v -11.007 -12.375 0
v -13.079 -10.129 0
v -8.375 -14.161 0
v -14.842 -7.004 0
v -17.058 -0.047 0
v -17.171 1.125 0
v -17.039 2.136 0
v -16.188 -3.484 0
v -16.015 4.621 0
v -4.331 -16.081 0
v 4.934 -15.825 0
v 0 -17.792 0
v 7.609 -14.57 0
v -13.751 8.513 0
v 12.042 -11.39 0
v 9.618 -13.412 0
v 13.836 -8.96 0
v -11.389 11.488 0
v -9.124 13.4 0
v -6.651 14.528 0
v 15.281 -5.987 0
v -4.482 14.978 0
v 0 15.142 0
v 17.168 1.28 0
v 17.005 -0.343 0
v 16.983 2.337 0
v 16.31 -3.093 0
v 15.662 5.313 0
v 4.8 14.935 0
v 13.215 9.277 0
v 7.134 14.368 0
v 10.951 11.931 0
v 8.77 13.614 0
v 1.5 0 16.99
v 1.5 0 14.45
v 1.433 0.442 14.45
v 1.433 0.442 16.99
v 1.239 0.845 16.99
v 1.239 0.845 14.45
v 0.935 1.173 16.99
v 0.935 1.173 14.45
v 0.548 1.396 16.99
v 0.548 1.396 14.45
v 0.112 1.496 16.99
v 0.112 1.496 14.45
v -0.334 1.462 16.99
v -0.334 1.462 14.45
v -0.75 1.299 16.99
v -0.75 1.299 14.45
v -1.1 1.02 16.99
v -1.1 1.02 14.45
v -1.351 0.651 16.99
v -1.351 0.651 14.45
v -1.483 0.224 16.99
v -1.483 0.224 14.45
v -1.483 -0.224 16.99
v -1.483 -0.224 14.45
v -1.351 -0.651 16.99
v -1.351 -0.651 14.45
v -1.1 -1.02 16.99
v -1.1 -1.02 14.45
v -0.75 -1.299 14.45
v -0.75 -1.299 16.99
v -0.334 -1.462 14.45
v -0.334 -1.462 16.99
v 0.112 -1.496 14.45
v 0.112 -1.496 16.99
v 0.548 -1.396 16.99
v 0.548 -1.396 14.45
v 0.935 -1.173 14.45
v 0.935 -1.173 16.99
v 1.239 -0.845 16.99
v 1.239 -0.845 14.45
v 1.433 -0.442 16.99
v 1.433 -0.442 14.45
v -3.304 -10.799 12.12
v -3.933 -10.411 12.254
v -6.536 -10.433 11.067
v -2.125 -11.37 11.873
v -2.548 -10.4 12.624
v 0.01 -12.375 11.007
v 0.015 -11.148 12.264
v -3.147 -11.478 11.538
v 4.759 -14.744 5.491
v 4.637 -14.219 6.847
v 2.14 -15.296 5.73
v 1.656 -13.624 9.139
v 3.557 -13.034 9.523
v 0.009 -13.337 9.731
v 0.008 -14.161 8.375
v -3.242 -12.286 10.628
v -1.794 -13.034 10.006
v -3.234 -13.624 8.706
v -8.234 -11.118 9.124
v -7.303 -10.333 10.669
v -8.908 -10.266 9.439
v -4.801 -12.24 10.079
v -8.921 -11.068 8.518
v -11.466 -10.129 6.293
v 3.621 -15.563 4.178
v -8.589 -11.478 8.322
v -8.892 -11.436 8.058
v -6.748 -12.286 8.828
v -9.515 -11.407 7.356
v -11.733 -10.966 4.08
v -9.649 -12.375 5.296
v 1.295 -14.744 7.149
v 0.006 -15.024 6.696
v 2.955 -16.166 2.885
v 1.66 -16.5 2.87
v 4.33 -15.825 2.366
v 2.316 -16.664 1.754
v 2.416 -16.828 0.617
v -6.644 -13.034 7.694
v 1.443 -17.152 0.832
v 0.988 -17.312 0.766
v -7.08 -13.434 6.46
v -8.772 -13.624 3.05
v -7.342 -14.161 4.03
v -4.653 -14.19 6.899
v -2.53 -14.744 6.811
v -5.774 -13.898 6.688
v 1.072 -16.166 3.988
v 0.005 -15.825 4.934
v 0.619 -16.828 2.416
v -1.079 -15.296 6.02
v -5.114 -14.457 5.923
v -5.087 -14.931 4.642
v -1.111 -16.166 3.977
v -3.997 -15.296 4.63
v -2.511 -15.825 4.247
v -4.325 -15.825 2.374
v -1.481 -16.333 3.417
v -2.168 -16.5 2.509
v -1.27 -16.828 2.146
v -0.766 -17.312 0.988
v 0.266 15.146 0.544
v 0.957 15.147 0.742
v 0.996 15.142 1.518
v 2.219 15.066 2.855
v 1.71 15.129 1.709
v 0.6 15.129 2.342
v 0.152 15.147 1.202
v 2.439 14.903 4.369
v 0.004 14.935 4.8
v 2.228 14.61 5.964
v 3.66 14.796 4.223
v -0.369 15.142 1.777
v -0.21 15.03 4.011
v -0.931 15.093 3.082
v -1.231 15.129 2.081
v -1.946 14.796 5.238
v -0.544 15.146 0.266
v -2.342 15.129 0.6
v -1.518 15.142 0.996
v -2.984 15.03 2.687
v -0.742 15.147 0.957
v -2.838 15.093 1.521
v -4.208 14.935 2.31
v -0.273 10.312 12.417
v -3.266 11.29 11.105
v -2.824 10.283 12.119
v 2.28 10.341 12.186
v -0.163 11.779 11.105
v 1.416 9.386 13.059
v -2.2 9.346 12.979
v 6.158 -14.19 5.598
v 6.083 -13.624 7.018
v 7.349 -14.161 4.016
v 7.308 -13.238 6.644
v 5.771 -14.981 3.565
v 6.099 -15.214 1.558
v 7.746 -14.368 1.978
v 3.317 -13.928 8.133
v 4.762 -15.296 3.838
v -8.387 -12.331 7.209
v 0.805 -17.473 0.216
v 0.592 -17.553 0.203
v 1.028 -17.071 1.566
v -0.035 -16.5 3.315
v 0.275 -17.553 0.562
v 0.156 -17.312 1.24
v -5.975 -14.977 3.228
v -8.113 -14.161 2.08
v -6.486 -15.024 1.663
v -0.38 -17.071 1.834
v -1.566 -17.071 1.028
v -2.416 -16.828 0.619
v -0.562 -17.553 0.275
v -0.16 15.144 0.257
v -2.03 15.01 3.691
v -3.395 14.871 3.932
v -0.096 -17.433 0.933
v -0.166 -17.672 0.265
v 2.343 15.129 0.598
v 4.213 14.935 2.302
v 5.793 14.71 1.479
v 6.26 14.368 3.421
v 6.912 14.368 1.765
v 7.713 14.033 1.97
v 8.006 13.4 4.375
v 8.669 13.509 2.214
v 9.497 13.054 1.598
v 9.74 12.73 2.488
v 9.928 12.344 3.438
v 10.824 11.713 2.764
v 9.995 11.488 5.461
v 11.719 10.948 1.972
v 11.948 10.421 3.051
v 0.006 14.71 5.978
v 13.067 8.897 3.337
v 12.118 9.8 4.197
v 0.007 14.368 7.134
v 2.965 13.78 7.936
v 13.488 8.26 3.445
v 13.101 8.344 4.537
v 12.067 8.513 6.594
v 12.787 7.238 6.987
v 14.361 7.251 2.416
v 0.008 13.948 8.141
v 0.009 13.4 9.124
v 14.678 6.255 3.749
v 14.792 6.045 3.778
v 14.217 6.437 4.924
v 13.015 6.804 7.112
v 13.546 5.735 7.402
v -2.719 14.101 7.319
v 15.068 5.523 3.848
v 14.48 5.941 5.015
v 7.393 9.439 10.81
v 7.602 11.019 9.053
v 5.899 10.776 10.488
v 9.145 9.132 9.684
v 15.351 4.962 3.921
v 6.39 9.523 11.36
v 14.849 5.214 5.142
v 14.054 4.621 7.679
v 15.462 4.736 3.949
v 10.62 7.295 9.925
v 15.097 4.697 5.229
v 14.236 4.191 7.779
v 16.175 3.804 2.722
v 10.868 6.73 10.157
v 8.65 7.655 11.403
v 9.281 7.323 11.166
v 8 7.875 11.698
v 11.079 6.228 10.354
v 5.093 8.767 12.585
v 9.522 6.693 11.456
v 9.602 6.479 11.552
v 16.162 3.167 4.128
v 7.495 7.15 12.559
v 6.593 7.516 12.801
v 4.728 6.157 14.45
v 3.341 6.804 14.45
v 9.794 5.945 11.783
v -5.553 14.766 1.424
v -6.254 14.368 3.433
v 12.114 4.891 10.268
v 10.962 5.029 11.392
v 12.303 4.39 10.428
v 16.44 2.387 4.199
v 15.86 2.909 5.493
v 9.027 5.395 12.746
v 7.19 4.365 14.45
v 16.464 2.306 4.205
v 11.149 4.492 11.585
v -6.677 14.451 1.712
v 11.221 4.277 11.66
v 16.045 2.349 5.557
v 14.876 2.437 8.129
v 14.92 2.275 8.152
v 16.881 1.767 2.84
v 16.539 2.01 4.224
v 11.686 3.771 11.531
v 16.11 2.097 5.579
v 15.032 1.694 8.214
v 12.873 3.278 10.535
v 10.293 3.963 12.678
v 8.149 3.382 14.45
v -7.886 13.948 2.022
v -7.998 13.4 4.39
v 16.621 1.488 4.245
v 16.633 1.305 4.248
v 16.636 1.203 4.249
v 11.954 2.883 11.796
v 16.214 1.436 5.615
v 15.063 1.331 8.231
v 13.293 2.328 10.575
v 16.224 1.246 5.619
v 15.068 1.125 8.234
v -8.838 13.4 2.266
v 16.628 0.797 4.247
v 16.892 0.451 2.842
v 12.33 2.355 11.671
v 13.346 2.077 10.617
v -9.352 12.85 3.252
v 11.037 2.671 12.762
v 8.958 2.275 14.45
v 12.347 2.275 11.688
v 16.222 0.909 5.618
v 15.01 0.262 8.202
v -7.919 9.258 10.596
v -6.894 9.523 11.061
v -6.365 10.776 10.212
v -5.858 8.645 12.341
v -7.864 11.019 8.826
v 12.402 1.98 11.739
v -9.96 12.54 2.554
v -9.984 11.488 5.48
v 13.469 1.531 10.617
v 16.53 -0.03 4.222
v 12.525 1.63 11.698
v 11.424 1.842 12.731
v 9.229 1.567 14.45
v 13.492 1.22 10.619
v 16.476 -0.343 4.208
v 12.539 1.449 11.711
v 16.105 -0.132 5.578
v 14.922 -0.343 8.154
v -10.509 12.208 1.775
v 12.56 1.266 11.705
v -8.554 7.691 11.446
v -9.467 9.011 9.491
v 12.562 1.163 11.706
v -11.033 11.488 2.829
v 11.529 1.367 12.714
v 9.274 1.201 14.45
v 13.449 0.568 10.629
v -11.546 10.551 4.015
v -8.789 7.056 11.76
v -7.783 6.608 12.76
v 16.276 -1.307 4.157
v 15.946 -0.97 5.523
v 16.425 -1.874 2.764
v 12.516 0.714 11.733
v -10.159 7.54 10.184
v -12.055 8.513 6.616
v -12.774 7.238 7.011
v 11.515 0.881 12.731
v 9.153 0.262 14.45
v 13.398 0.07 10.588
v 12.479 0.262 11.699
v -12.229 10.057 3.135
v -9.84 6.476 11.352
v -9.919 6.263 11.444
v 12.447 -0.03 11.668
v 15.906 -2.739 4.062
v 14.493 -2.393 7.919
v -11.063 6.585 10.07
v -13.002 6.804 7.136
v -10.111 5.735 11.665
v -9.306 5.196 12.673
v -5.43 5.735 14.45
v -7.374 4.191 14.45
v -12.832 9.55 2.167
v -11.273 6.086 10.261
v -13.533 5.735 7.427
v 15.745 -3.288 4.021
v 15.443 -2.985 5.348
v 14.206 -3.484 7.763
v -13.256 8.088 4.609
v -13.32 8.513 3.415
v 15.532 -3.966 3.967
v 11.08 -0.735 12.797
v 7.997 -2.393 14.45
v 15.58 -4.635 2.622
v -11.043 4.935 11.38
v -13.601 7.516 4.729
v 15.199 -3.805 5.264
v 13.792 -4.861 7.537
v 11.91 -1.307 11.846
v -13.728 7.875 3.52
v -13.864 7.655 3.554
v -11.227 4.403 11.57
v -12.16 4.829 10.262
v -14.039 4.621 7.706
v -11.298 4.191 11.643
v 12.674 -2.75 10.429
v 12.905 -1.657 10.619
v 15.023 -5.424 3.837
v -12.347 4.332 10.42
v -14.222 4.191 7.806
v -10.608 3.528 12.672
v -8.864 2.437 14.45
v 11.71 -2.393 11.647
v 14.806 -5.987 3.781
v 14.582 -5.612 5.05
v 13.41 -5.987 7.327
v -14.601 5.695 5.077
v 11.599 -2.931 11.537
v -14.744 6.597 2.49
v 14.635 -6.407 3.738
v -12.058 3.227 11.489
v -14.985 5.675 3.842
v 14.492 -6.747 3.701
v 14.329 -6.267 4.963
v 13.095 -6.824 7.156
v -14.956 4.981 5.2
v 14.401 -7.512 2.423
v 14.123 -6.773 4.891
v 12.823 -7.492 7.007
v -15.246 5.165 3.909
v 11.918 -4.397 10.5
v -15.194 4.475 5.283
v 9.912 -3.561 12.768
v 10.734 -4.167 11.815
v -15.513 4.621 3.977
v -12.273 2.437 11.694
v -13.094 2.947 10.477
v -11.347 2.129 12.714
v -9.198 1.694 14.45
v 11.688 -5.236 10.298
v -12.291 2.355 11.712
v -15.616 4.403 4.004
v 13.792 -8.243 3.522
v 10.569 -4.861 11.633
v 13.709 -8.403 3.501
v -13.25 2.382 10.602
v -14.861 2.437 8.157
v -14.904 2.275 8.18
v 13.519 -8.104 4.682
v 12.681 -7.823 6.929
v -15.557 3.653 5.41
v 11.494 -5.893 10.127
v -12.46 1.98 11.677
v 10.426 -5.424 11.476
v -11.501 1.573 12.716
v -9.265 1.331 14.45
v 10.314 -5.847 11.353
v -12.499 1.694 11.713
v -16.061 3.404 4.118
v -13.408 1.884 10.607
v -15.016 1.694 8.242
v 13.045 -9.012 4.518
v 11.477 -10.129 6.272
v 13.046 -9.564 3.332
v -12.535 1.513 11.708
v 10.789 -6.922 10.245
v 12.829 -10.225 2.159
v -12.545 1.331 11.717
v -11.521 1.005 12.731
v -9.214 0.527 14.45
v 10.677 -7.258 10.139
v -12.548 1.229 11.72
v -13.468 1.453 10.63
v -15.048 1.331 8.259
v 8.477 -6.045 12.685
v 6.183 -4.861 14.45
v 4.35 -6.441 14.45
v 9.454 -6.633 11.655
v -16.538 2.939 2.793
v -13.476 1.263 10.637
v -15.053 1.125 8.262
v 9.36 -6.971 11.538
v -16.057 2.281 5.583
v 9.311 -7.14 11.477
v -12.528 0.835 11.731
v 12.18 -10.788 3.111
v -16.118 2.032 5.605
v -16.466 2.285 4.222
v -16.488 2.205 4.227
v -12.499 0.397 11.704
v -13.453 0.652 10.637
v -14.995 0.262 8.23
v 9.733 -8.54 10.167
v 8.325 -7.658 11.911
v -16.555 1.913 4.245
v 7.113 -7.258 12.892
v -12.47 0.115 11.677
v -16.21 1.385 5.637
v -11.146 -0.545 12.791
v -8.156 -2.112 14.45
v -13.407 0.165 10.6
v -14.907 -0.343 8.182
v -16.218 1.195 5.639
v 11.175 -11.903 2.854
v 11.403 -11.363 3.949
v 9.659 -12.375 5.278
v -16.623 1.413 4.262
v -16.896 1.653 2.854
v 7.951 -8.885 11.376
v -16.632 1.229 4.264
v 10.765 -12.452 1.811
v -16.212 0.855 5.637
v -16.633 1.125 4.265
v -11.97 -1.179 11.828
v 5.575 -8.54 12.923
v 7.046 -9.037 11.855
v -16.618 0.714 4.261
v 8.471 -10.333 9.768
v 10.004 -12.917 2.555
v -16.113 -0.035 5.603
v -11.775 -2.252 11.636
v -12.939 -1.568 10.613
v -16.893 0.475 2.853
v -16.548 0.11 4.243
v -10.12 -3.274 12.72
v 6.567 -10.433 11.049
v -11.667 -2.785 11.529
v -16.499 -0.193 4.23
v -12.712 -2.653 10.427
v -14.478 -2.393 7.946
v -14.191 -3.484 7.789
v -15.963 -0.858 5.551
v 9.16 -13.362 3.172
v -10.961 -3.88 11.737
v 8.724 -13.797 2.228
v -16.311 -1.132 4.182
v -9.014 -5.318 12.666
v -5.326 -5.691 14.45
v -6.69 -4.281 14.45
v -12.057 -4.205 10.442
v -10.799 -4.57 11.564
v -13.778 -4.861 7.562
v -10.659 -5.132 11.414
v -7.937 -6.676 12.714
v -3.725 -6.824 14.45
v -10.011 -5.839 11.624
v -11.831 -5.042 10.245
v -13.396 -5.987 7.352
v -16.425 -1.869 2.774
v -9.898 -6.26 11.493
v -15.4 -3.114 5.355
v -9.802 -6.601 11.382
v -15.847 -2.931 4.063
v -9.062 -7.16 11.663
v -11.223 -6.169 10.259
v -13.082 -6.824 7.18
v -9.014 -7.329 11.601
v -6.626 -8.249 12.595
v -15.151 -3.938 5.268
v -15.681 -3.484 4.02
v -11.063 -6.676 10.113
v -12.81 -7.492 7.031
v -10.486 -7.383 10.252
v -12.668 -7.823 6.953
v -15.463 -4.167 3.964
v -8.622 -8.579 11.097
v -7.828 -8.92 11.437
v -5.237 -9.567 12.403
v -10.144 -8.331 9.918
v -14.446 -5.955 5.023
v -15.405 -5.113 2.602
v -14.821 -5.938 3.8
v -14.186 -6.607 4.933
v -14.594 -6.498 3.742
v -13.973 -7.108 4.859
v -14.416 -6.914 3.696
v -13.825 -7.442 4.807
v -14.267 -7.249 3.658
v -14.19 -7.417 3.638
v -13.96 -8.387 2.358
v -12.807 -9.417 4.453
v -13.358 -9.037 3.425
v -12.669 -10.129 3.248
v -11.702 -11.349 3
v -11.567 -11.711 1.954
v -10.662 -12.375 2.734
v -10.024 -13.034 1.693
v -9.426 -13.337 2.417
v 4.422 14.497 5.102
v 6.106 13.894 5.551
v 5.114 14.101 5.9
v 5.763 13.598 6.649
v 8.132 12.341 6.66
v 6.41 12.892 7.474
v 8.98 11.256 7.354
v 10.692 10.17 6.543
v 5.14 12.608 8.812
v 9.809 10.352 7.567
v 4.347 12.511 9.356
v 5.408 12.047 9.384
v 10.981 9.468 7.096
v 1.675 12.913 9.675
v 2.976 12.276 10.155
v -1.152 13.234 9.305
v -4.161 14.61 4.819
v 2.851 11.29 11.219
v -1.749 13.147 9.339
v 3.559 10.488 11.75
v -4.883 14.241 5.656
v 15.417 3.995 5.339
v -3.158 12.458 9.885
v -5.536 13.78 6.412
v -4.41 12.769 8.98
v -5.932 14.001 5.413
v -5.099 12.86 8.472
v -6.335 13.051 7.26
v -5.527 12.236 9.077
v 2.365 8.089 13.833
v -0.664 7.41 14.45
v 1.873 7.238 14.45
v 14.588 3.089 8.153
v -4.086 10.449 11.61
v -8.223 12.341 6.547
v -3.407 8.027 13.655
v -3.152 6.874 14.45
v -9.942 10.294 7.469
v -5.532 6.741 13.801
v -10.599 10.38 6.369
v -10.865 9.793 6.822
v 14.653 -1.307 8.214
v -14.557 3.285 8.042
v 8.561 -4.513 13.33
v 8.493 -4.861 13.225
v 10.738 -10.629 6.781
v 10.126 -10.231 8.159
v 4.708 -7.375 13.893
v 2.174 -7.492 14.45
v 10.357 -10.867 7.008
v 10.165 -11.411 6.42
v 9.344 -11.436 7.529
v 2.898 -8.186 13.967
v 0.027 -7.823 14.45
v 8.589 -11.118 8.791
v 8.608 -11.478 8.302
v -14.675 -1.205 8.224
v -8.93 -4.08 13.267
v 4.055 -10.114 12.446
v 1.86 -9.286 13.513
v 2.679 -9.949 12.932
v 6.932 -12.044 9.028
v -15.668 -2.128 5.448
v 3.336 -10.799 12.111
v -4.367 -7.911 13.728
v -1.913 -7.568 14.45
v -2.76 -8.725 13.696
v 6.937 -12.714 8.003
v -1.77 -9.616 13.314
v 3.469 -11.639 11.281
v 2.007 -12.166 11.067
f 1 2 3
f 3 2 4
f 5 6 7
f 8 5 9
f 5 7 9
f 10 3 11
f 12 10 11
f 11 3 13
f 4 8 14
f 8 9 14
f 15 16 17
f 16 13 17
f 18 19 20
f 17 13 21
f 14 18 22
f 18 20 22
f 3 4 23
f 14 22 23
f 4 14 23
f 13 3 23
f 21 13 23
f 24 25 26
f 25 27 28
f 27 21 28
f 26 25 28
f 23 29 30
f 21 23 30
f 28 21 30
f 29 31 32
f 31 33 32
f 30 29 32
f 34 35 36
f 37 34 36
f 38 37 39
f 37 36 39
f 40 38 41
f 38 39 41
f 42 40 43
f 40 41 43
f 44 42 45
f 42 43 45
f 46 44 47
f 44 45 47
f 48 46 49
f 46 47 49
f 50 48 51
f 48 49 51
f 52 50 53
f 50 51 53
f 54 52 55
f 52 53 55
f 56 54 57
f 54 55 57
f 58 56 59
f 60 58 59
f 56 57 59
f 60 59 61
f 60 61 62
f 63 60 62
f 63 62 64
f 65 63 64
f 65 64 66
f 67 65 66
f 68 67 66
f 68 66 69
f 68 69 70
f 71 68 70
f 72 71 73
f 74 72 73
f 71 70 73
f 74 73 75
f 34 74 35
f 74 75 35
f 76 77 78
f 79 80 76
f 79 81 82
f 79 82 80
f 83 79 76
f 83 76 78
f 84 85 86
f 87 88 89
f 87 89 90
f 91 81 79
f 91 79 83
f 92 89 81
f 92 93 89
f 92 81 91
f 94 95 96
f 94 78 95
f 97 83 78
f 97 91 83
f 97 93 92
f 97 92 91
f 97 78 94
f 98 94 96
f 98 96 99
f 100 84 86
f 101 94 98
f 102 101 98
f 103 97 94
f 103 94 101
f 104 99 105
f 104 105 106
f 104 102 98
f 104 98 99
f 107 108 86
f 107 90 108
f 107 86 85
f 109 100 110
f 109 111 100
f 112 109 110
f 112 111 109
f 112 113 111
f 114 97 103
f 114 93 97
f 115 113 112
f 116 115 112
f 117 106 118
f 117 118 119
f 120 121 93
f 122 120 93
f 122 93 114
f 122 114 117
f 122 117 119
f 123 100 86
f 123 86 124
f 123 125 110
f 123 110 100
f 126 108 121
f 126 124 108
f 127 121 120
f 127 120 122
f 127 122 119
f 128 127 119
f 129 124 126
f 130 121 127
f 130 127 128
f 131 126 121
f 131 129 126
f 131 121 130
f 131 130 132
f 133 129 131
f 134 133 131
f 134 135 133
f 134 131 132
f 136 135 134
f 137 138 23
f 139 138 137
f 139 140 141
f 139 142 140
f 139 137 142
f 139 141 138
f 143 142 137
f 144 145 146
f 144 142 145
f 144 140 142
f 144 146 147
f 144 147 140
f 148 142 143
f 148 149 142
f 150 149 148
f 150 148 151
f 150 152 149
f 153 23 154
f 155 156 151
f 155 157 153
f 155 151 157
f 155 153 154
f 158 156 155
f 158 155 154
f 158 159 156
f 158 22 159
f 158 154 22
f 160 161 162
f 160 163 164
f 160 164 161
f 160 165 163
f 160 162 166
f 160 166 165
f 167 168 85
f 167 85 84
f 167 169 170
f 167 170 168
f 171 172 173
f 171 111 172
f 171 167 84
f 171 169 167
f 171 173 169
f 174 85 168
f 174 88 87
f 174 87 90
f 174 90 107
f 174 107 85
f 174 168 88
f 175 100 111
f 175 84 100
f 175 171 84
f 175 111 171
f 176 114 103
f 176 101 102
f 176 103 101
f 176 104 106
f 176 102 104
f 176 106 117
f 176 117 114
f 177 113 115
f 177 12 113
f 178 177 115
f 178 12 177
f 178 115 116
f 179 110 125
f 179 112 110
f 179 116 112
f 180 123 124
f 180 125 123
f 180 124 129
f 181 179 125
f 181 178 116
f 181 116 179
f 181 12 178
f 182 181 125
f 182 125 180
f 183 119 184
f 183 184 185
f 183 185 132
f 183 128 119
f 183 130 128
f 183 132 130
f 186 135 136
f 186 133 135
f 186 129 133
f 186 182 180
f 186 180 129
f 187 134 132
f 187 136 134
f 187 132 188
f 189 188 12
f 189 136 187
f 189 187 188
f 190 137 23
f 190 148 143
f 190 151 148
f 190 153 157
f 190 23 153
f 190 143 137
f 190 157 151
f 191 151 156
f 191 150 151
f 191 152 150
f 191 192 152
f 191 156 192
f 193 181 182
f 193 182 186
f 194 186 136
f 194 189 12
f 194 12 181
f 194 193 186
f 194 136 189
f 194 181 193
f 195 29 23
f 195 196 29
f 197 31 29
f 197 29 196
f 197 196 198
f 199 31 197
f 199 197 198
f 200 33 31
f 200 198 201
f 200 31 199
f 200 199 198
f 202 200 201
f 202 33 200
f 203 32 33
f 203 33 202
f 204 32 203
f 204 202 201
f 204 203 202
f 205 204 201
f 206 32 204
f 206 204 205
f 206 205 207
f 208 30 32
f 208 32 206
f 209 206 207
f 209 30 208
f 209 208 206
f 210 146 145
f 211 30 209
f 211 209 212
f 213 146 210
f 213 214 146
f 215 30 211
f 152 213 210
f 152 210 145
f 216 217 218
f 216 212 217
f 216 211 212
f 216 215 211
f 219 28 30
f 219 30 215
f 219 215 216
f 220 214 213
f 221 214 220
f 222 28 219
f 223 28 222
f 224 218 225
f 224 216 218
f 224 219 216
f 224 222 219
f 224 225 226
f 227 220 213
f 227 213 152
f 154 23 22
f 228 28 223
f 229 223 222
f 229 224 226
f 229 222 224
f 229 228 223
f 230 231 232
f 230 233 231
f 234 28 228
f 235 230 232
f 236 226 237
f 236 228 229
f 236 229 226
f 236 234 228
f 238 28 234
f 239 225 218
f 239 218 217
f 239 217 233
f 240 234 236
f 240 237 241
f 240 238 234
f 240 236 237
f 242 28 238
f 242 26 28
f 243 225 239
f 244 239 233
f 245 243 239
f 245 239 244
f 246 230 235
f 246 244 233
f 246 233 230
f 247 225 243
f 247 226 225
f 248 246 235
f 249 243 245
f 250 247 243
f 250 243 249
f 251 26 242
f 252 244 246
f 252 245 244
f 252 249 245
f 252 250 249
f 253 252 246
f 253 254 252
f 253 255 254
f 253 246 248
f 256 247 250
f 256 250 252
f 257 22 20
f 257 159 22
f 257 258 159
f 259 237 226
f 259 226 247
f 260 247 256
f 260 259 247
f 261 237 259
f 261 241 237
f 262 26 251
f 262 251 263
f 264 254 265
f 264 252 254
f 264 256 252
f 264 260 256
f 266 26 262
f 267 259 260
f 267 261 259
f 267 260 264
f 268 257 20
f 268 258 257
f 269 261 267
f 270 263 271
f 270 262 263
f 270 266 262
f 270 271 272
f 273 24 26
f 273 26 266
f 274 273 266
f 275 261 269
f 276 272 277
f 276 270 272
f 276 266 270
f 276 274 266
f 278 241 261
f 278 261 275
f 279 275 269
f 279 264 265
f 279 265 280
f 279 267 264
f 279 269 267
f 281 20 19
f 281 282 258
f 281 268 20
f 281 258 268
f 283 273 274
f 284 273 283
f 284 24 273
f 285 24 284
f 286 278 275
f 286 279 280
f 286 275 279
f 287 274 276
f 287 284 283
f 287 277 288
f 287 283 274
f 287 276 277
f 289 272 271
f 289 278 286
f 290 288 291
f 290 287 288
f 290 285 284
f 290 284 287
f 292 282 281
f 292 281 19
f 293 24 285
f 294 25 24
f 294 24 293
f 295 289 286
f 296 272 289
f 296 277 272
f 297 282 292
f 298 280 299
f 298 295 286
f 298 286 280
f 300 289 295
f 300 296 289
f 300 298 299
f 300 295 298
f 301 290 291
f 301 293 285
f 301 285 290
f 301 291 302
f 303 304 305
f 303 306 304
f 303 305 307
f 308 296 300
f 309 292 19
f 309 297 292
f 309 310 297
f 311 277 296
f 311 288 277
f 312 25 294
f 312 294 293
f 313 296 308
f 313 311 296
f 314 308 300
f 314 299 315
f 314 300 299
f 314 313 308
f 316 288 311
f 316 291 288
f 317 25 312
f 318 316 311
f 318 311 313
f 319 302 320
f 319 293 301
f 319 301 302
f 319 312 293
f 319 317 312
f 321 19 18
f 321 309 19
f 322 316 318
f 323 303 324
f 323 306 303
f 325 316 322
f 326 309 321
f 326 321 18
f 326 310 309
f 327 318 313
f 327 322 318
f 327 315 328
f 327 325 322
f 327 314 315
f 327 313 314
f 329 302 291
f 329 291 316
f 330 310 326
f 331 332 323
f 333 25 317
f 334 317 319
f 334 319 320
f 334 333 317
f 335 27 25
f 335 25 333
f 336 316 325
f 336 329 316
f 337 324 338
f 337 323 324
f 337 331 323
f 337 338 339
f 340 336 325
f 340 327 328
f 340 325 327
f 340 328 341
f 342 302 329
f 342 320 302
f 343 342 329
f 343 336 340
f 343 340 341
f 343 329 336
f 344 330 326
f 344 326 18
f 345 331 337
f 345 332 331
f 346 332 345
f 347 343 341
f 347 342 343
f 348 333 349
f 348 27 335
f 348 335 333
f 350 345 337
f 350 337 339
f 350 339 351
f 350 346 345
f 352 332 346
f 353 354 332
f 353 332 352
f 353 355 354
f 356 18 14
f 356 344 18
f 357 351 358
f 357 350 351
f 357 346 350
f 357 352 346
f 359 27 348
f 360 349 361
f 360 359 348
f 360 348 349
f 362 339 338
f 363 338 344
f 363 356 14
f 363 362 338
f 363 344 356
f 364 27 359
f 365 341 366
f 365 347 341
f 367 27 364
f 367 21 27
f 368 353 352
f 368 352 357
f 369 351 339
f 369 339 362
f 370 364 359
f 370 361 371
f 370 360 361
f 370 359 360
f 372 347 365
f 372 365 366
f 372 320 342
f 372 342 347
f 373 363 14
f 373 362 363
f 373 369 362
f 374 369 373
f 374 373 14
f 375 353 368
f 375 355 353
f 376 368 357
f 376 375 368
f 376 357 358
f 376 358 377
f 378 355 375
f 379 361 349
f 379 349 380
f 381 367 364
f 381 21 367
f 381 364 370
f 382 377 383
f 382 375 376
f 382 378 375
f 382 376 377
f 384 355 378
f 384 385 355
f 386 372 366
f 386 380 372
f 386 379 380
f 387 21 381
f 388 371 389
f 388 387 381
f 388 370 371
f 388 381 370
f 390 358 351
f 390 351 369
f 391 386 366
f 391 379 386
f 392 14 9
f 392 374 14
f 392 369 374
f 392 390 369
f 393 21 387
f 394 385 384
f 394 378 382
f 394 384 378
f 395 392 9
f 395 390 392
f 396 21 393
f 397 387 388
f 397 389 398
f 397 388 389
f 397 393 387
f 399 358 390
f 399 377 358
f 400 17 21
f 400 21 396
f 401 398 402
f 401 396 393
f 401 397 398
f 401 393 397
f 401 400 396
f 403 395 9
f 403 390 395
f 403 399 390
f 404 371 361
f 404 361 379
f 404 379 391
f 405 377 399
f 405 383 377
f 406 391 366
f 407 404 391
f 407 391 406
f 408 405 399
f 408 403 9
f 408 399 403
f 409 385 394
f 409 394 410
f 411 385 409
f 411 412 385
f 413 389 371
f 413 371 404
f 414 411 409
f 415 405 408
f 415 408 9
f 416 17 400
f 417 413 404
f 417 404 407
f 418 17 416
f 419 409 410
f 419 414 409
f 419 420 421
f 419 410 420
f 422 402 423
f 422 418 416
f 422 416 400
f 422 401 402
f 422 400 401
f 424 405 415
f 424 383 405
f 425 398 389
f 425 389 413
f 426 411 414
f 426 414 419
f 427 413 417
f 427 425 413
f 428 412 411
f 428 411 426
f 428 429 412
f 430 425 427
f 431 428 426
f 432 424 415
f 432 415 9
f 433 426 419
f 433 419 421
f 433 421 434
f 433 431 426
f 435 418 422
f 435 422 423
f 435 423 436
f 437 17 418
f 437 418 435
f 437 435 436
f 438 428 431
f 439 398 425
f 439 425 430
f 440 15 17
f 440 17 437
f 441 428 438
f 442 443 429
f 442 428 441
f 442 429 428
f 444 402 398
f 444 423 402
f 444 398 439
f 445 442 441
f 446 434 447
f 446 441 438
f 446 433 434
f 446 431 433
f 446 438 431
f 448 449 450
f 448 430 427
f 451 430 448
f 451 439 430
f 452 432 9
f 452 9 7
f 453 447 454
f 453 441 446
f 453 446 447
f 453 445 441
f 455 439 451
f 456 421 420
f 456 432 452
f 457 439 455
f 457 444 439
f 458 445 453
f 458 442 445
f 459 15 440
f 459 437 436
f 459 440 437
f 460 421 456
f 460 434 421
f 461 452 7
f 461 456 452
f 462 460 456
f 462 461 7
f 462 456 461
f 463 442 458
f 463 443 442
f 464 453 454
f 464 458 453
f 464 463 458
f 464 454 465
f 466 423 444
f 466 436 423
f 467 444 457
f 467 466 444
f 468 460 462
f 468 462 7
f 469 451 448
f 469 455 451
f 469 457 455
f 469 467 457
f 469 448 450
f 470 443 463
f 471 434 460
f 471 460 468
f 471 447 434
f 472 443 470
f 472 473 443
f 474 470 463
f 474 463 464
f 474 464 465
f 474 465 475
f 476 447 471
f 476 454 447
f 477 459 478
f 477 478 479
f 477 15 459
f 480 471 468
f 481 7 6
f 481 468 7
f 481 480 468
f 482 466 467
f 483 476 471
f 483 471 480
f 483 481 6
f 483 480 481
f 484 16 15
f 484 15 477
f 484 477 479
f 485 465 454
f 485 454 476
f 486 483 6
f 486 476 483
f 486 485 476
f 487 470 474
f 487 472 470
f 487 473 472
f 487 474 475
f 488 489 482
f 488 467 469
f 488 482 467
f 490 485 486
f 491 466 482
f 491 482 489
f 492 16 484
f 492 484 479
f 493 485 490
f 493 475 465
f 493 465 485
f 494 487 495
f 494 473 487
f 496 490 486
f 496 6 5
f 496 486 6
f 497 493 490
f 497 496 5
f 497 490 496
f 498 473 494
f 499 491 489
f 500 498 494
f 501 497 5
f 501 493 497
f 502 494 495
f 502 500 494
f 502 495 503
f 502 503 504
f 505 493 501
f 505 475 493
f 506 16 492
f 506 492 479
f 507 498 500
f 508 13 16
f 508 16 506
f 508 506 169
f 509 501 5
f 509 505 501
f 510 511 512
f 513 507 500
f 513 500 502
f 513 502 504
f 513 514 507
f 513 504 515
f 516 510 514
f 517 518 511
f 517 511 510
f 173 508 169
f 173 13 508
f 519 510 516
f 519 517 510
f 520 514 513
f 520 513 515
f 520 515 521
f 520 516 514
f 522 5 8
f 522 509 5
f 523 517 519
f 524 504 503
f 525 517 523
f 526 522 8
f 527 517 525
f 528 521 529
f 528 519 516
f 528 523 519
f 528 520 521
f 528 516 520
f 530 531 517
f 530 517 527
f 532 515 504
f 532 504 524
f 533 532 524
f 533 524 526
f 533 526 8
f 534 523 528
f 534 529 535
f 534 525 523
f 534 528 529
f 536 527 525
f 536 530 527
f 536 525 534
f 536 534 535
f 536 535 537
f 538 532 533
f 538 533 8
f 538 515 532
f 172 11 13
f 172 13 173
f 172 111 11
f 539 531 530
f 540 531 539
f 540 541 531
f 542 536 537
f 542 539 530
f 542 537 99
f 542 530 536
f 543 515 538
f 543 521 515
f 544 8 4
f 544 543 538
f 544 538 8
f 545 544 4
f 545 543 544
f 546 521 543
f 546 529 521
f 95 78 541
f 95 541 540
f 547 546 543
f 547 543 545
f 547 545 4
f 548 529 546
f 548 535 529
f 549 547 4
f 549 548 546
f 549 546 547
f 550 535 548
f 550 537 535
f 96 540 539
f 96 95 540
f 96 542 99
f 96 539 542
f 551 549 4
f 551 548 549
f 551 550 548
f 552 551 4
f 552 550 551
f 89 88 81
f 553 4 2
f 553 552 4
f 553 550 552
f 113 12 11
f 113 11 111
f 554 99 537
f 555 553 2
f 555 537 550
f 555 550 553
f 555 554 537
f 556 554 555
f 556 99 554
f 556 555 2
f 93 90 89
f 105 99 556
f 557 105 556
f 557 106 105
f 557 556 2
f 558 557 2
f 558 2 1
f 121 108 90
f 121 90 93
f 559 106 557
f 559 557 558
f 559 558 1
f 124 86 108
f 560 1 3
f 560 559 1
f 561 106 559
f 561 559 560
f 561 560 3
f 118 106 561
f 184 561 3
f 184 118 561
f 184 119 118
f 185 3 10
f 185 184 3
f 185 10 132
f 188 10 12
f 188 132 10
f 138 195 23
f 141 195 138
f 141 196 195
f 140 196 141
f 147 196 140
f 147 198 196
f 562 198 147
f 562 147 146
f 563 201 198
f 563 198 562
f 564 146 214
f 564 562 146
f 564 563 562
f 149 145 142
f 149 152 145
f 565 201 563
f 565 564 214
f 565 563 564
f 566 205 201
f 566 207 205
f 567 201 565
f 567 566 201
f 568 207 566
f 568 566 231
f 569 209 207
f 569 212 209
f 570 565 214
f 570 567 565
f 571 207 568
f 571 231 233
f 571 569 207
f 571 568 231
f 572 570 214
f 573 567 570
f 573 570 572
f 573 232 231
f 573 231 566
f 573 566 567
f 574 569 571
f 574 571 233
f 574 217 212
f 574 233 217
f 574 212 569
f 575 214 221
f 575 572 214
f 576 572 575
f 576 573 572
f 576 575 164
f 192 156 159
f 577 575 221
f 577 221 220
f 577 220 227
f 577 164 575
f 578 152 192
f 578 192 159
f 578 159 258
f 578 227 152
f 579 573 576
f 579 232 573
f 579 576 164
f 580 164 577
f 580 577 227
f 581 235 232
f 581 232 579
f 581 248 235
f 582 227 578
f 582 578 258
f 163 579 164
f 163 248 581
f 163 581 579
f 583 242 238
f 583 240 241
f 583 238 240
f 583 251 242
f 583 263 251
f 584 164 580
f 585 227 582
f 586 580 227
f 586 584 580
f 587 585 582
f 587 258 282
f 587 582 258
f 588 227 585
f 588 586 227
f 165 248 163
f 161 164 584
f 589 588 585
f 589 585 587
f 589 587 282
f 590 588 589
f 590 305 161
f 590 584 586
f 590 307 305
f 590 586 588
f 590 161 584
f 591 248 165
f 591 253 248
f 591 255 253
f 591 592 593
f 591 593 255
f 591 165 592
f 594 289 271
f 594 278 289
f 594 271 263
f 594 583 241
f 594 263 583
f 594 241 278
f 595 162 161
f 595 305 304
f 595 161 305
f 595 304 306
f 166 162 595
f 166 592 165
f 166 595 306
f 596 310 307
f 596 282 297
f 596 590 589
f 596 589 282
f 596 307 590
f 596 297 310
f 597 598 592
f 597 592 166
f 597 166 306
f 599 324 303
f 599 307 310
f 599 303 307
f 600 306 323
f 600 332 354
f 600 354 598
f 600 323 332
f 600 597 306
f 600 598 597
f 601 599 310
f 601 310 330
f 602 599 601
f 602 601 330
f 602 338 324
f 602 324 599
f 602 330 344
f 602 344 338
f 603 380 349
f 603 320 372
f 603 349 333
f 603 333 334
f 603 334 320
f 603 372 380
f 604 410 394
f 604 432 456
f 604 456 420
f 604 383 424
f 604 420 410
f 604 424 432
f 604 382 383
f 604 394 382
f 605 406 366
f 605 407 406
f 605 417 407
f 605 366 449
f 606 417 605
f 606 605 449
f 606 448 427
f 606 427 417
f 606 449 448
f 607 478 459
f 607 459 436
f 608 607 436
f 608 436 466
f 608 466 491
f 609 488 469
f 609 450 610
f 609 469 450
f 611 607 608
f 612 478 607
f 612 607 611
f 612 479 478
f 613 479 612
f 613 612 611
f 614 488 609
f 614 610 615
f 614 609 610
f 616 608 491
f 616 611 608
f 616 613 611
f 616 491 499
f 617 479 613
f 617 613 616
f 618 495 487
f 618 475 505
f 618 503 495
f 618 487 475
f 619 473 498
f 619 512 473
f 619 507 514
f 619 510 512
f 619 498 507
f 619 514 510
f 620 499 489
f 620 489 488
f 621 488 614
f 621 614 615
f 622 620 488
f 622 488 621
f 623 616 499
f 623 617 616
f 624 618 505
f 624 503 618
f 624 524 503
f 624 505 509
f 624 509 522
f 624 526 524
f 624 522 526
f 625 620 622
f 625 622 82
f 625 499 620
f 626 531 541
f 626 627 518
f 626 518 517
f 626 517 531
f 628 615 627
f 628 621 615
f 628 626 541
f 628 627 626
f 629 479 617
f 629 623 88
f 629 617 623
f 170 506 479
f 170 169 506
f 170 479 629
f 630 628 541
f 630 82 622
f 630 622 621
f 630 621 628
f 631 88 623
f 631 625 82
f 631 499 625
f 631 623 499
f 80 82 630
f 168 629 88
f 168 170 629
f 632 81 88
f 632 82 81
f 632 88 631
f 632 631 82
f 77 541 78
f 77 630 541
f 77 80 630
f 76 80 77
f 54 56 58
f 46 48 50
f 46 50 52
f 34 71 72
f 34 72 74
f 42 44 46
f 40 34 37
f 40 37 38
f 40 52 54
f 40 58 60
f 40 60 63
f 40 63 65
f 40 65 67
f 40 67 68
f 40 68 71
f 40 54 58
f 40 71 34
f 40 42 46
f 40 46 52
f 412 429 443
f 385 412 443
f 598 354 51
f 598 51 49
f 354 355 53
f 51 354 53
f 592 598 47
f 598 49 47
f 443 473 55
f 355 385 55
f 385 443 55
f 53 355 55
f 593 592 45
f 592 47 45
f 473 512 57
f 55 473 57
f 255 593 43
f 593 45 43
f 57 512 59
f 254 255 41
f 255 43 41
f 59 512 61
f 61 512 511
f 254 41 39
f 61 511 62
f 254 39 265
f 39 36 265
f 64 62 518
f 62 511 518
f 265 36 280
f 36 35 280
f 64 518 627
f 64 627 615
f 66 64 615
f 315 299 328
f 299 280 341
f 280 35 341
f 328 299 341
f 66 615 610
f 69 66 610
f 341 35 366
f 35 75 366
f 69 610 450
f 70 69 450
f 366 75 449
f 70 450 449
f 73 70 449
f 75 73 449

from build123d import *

# Parameters (mm, degrees)
F2_W     = 126.1226348579
F2_H     = 41.0738363862
F2_W_2   = 95.882229507
F2_H_2   = 28.761270456
F3_DEPTH = 25.4
F4_R     = 1.5
F5_DEPTH = 2.54


with BuildPart() as f1:
    # F0 (on Top) → F1 (revolve)
    with BuildSketch(Plane.XY):
        with BuildLine():
            Line((0, -17.7920795977), (0, 15.1420421898))
            add(Edge.make_bspline(
                [(0, 15.1420421898), (-3.3266345491, 15.1660395685), (-10.3432012836, 15.2166550499), (-16.9798857885, 3.2507688533), (-17.4681972374, 0.1800565782), (-14.1186973605, -10.5597484182), (-7.7260639278, -14.8351312564), (-2.5986913336, -16.7974986441), (0, -17.7920795977)],
                knots=[0, 0, 0, 0, 0.1810593521, 0.3818919716, 0.4880171584, 0.6735828531, 0.8345629472, 1, 1, 1, 1], degree=3))
        make_face()
    revolve(axis=Axis((0, -1.3250187039, 0), (0, -1, 0)))

    # F2 (on Front) → F3 (cut, symmetric)
    with BuildSketch(Plane.XZ):
        with Locations((5.4968688637, -20.5369181931)):
            Rectangle(F2_W, F2_H)
        with Locations((1.9811727107, 28.830869589)):
            Rectangle(F2_W_2, F2_H_2)
    extrude(amount=F3_DEPTH, both=True, mode=Mode.SUBTRACT)

    # F4 (on face) → F5 (join)
    with BuildSketch(Plane.XY.offset(14.450234361)):
        Circle(F4_R)
    extrude(amount=F5_DEPTH)


solid = f1.part
